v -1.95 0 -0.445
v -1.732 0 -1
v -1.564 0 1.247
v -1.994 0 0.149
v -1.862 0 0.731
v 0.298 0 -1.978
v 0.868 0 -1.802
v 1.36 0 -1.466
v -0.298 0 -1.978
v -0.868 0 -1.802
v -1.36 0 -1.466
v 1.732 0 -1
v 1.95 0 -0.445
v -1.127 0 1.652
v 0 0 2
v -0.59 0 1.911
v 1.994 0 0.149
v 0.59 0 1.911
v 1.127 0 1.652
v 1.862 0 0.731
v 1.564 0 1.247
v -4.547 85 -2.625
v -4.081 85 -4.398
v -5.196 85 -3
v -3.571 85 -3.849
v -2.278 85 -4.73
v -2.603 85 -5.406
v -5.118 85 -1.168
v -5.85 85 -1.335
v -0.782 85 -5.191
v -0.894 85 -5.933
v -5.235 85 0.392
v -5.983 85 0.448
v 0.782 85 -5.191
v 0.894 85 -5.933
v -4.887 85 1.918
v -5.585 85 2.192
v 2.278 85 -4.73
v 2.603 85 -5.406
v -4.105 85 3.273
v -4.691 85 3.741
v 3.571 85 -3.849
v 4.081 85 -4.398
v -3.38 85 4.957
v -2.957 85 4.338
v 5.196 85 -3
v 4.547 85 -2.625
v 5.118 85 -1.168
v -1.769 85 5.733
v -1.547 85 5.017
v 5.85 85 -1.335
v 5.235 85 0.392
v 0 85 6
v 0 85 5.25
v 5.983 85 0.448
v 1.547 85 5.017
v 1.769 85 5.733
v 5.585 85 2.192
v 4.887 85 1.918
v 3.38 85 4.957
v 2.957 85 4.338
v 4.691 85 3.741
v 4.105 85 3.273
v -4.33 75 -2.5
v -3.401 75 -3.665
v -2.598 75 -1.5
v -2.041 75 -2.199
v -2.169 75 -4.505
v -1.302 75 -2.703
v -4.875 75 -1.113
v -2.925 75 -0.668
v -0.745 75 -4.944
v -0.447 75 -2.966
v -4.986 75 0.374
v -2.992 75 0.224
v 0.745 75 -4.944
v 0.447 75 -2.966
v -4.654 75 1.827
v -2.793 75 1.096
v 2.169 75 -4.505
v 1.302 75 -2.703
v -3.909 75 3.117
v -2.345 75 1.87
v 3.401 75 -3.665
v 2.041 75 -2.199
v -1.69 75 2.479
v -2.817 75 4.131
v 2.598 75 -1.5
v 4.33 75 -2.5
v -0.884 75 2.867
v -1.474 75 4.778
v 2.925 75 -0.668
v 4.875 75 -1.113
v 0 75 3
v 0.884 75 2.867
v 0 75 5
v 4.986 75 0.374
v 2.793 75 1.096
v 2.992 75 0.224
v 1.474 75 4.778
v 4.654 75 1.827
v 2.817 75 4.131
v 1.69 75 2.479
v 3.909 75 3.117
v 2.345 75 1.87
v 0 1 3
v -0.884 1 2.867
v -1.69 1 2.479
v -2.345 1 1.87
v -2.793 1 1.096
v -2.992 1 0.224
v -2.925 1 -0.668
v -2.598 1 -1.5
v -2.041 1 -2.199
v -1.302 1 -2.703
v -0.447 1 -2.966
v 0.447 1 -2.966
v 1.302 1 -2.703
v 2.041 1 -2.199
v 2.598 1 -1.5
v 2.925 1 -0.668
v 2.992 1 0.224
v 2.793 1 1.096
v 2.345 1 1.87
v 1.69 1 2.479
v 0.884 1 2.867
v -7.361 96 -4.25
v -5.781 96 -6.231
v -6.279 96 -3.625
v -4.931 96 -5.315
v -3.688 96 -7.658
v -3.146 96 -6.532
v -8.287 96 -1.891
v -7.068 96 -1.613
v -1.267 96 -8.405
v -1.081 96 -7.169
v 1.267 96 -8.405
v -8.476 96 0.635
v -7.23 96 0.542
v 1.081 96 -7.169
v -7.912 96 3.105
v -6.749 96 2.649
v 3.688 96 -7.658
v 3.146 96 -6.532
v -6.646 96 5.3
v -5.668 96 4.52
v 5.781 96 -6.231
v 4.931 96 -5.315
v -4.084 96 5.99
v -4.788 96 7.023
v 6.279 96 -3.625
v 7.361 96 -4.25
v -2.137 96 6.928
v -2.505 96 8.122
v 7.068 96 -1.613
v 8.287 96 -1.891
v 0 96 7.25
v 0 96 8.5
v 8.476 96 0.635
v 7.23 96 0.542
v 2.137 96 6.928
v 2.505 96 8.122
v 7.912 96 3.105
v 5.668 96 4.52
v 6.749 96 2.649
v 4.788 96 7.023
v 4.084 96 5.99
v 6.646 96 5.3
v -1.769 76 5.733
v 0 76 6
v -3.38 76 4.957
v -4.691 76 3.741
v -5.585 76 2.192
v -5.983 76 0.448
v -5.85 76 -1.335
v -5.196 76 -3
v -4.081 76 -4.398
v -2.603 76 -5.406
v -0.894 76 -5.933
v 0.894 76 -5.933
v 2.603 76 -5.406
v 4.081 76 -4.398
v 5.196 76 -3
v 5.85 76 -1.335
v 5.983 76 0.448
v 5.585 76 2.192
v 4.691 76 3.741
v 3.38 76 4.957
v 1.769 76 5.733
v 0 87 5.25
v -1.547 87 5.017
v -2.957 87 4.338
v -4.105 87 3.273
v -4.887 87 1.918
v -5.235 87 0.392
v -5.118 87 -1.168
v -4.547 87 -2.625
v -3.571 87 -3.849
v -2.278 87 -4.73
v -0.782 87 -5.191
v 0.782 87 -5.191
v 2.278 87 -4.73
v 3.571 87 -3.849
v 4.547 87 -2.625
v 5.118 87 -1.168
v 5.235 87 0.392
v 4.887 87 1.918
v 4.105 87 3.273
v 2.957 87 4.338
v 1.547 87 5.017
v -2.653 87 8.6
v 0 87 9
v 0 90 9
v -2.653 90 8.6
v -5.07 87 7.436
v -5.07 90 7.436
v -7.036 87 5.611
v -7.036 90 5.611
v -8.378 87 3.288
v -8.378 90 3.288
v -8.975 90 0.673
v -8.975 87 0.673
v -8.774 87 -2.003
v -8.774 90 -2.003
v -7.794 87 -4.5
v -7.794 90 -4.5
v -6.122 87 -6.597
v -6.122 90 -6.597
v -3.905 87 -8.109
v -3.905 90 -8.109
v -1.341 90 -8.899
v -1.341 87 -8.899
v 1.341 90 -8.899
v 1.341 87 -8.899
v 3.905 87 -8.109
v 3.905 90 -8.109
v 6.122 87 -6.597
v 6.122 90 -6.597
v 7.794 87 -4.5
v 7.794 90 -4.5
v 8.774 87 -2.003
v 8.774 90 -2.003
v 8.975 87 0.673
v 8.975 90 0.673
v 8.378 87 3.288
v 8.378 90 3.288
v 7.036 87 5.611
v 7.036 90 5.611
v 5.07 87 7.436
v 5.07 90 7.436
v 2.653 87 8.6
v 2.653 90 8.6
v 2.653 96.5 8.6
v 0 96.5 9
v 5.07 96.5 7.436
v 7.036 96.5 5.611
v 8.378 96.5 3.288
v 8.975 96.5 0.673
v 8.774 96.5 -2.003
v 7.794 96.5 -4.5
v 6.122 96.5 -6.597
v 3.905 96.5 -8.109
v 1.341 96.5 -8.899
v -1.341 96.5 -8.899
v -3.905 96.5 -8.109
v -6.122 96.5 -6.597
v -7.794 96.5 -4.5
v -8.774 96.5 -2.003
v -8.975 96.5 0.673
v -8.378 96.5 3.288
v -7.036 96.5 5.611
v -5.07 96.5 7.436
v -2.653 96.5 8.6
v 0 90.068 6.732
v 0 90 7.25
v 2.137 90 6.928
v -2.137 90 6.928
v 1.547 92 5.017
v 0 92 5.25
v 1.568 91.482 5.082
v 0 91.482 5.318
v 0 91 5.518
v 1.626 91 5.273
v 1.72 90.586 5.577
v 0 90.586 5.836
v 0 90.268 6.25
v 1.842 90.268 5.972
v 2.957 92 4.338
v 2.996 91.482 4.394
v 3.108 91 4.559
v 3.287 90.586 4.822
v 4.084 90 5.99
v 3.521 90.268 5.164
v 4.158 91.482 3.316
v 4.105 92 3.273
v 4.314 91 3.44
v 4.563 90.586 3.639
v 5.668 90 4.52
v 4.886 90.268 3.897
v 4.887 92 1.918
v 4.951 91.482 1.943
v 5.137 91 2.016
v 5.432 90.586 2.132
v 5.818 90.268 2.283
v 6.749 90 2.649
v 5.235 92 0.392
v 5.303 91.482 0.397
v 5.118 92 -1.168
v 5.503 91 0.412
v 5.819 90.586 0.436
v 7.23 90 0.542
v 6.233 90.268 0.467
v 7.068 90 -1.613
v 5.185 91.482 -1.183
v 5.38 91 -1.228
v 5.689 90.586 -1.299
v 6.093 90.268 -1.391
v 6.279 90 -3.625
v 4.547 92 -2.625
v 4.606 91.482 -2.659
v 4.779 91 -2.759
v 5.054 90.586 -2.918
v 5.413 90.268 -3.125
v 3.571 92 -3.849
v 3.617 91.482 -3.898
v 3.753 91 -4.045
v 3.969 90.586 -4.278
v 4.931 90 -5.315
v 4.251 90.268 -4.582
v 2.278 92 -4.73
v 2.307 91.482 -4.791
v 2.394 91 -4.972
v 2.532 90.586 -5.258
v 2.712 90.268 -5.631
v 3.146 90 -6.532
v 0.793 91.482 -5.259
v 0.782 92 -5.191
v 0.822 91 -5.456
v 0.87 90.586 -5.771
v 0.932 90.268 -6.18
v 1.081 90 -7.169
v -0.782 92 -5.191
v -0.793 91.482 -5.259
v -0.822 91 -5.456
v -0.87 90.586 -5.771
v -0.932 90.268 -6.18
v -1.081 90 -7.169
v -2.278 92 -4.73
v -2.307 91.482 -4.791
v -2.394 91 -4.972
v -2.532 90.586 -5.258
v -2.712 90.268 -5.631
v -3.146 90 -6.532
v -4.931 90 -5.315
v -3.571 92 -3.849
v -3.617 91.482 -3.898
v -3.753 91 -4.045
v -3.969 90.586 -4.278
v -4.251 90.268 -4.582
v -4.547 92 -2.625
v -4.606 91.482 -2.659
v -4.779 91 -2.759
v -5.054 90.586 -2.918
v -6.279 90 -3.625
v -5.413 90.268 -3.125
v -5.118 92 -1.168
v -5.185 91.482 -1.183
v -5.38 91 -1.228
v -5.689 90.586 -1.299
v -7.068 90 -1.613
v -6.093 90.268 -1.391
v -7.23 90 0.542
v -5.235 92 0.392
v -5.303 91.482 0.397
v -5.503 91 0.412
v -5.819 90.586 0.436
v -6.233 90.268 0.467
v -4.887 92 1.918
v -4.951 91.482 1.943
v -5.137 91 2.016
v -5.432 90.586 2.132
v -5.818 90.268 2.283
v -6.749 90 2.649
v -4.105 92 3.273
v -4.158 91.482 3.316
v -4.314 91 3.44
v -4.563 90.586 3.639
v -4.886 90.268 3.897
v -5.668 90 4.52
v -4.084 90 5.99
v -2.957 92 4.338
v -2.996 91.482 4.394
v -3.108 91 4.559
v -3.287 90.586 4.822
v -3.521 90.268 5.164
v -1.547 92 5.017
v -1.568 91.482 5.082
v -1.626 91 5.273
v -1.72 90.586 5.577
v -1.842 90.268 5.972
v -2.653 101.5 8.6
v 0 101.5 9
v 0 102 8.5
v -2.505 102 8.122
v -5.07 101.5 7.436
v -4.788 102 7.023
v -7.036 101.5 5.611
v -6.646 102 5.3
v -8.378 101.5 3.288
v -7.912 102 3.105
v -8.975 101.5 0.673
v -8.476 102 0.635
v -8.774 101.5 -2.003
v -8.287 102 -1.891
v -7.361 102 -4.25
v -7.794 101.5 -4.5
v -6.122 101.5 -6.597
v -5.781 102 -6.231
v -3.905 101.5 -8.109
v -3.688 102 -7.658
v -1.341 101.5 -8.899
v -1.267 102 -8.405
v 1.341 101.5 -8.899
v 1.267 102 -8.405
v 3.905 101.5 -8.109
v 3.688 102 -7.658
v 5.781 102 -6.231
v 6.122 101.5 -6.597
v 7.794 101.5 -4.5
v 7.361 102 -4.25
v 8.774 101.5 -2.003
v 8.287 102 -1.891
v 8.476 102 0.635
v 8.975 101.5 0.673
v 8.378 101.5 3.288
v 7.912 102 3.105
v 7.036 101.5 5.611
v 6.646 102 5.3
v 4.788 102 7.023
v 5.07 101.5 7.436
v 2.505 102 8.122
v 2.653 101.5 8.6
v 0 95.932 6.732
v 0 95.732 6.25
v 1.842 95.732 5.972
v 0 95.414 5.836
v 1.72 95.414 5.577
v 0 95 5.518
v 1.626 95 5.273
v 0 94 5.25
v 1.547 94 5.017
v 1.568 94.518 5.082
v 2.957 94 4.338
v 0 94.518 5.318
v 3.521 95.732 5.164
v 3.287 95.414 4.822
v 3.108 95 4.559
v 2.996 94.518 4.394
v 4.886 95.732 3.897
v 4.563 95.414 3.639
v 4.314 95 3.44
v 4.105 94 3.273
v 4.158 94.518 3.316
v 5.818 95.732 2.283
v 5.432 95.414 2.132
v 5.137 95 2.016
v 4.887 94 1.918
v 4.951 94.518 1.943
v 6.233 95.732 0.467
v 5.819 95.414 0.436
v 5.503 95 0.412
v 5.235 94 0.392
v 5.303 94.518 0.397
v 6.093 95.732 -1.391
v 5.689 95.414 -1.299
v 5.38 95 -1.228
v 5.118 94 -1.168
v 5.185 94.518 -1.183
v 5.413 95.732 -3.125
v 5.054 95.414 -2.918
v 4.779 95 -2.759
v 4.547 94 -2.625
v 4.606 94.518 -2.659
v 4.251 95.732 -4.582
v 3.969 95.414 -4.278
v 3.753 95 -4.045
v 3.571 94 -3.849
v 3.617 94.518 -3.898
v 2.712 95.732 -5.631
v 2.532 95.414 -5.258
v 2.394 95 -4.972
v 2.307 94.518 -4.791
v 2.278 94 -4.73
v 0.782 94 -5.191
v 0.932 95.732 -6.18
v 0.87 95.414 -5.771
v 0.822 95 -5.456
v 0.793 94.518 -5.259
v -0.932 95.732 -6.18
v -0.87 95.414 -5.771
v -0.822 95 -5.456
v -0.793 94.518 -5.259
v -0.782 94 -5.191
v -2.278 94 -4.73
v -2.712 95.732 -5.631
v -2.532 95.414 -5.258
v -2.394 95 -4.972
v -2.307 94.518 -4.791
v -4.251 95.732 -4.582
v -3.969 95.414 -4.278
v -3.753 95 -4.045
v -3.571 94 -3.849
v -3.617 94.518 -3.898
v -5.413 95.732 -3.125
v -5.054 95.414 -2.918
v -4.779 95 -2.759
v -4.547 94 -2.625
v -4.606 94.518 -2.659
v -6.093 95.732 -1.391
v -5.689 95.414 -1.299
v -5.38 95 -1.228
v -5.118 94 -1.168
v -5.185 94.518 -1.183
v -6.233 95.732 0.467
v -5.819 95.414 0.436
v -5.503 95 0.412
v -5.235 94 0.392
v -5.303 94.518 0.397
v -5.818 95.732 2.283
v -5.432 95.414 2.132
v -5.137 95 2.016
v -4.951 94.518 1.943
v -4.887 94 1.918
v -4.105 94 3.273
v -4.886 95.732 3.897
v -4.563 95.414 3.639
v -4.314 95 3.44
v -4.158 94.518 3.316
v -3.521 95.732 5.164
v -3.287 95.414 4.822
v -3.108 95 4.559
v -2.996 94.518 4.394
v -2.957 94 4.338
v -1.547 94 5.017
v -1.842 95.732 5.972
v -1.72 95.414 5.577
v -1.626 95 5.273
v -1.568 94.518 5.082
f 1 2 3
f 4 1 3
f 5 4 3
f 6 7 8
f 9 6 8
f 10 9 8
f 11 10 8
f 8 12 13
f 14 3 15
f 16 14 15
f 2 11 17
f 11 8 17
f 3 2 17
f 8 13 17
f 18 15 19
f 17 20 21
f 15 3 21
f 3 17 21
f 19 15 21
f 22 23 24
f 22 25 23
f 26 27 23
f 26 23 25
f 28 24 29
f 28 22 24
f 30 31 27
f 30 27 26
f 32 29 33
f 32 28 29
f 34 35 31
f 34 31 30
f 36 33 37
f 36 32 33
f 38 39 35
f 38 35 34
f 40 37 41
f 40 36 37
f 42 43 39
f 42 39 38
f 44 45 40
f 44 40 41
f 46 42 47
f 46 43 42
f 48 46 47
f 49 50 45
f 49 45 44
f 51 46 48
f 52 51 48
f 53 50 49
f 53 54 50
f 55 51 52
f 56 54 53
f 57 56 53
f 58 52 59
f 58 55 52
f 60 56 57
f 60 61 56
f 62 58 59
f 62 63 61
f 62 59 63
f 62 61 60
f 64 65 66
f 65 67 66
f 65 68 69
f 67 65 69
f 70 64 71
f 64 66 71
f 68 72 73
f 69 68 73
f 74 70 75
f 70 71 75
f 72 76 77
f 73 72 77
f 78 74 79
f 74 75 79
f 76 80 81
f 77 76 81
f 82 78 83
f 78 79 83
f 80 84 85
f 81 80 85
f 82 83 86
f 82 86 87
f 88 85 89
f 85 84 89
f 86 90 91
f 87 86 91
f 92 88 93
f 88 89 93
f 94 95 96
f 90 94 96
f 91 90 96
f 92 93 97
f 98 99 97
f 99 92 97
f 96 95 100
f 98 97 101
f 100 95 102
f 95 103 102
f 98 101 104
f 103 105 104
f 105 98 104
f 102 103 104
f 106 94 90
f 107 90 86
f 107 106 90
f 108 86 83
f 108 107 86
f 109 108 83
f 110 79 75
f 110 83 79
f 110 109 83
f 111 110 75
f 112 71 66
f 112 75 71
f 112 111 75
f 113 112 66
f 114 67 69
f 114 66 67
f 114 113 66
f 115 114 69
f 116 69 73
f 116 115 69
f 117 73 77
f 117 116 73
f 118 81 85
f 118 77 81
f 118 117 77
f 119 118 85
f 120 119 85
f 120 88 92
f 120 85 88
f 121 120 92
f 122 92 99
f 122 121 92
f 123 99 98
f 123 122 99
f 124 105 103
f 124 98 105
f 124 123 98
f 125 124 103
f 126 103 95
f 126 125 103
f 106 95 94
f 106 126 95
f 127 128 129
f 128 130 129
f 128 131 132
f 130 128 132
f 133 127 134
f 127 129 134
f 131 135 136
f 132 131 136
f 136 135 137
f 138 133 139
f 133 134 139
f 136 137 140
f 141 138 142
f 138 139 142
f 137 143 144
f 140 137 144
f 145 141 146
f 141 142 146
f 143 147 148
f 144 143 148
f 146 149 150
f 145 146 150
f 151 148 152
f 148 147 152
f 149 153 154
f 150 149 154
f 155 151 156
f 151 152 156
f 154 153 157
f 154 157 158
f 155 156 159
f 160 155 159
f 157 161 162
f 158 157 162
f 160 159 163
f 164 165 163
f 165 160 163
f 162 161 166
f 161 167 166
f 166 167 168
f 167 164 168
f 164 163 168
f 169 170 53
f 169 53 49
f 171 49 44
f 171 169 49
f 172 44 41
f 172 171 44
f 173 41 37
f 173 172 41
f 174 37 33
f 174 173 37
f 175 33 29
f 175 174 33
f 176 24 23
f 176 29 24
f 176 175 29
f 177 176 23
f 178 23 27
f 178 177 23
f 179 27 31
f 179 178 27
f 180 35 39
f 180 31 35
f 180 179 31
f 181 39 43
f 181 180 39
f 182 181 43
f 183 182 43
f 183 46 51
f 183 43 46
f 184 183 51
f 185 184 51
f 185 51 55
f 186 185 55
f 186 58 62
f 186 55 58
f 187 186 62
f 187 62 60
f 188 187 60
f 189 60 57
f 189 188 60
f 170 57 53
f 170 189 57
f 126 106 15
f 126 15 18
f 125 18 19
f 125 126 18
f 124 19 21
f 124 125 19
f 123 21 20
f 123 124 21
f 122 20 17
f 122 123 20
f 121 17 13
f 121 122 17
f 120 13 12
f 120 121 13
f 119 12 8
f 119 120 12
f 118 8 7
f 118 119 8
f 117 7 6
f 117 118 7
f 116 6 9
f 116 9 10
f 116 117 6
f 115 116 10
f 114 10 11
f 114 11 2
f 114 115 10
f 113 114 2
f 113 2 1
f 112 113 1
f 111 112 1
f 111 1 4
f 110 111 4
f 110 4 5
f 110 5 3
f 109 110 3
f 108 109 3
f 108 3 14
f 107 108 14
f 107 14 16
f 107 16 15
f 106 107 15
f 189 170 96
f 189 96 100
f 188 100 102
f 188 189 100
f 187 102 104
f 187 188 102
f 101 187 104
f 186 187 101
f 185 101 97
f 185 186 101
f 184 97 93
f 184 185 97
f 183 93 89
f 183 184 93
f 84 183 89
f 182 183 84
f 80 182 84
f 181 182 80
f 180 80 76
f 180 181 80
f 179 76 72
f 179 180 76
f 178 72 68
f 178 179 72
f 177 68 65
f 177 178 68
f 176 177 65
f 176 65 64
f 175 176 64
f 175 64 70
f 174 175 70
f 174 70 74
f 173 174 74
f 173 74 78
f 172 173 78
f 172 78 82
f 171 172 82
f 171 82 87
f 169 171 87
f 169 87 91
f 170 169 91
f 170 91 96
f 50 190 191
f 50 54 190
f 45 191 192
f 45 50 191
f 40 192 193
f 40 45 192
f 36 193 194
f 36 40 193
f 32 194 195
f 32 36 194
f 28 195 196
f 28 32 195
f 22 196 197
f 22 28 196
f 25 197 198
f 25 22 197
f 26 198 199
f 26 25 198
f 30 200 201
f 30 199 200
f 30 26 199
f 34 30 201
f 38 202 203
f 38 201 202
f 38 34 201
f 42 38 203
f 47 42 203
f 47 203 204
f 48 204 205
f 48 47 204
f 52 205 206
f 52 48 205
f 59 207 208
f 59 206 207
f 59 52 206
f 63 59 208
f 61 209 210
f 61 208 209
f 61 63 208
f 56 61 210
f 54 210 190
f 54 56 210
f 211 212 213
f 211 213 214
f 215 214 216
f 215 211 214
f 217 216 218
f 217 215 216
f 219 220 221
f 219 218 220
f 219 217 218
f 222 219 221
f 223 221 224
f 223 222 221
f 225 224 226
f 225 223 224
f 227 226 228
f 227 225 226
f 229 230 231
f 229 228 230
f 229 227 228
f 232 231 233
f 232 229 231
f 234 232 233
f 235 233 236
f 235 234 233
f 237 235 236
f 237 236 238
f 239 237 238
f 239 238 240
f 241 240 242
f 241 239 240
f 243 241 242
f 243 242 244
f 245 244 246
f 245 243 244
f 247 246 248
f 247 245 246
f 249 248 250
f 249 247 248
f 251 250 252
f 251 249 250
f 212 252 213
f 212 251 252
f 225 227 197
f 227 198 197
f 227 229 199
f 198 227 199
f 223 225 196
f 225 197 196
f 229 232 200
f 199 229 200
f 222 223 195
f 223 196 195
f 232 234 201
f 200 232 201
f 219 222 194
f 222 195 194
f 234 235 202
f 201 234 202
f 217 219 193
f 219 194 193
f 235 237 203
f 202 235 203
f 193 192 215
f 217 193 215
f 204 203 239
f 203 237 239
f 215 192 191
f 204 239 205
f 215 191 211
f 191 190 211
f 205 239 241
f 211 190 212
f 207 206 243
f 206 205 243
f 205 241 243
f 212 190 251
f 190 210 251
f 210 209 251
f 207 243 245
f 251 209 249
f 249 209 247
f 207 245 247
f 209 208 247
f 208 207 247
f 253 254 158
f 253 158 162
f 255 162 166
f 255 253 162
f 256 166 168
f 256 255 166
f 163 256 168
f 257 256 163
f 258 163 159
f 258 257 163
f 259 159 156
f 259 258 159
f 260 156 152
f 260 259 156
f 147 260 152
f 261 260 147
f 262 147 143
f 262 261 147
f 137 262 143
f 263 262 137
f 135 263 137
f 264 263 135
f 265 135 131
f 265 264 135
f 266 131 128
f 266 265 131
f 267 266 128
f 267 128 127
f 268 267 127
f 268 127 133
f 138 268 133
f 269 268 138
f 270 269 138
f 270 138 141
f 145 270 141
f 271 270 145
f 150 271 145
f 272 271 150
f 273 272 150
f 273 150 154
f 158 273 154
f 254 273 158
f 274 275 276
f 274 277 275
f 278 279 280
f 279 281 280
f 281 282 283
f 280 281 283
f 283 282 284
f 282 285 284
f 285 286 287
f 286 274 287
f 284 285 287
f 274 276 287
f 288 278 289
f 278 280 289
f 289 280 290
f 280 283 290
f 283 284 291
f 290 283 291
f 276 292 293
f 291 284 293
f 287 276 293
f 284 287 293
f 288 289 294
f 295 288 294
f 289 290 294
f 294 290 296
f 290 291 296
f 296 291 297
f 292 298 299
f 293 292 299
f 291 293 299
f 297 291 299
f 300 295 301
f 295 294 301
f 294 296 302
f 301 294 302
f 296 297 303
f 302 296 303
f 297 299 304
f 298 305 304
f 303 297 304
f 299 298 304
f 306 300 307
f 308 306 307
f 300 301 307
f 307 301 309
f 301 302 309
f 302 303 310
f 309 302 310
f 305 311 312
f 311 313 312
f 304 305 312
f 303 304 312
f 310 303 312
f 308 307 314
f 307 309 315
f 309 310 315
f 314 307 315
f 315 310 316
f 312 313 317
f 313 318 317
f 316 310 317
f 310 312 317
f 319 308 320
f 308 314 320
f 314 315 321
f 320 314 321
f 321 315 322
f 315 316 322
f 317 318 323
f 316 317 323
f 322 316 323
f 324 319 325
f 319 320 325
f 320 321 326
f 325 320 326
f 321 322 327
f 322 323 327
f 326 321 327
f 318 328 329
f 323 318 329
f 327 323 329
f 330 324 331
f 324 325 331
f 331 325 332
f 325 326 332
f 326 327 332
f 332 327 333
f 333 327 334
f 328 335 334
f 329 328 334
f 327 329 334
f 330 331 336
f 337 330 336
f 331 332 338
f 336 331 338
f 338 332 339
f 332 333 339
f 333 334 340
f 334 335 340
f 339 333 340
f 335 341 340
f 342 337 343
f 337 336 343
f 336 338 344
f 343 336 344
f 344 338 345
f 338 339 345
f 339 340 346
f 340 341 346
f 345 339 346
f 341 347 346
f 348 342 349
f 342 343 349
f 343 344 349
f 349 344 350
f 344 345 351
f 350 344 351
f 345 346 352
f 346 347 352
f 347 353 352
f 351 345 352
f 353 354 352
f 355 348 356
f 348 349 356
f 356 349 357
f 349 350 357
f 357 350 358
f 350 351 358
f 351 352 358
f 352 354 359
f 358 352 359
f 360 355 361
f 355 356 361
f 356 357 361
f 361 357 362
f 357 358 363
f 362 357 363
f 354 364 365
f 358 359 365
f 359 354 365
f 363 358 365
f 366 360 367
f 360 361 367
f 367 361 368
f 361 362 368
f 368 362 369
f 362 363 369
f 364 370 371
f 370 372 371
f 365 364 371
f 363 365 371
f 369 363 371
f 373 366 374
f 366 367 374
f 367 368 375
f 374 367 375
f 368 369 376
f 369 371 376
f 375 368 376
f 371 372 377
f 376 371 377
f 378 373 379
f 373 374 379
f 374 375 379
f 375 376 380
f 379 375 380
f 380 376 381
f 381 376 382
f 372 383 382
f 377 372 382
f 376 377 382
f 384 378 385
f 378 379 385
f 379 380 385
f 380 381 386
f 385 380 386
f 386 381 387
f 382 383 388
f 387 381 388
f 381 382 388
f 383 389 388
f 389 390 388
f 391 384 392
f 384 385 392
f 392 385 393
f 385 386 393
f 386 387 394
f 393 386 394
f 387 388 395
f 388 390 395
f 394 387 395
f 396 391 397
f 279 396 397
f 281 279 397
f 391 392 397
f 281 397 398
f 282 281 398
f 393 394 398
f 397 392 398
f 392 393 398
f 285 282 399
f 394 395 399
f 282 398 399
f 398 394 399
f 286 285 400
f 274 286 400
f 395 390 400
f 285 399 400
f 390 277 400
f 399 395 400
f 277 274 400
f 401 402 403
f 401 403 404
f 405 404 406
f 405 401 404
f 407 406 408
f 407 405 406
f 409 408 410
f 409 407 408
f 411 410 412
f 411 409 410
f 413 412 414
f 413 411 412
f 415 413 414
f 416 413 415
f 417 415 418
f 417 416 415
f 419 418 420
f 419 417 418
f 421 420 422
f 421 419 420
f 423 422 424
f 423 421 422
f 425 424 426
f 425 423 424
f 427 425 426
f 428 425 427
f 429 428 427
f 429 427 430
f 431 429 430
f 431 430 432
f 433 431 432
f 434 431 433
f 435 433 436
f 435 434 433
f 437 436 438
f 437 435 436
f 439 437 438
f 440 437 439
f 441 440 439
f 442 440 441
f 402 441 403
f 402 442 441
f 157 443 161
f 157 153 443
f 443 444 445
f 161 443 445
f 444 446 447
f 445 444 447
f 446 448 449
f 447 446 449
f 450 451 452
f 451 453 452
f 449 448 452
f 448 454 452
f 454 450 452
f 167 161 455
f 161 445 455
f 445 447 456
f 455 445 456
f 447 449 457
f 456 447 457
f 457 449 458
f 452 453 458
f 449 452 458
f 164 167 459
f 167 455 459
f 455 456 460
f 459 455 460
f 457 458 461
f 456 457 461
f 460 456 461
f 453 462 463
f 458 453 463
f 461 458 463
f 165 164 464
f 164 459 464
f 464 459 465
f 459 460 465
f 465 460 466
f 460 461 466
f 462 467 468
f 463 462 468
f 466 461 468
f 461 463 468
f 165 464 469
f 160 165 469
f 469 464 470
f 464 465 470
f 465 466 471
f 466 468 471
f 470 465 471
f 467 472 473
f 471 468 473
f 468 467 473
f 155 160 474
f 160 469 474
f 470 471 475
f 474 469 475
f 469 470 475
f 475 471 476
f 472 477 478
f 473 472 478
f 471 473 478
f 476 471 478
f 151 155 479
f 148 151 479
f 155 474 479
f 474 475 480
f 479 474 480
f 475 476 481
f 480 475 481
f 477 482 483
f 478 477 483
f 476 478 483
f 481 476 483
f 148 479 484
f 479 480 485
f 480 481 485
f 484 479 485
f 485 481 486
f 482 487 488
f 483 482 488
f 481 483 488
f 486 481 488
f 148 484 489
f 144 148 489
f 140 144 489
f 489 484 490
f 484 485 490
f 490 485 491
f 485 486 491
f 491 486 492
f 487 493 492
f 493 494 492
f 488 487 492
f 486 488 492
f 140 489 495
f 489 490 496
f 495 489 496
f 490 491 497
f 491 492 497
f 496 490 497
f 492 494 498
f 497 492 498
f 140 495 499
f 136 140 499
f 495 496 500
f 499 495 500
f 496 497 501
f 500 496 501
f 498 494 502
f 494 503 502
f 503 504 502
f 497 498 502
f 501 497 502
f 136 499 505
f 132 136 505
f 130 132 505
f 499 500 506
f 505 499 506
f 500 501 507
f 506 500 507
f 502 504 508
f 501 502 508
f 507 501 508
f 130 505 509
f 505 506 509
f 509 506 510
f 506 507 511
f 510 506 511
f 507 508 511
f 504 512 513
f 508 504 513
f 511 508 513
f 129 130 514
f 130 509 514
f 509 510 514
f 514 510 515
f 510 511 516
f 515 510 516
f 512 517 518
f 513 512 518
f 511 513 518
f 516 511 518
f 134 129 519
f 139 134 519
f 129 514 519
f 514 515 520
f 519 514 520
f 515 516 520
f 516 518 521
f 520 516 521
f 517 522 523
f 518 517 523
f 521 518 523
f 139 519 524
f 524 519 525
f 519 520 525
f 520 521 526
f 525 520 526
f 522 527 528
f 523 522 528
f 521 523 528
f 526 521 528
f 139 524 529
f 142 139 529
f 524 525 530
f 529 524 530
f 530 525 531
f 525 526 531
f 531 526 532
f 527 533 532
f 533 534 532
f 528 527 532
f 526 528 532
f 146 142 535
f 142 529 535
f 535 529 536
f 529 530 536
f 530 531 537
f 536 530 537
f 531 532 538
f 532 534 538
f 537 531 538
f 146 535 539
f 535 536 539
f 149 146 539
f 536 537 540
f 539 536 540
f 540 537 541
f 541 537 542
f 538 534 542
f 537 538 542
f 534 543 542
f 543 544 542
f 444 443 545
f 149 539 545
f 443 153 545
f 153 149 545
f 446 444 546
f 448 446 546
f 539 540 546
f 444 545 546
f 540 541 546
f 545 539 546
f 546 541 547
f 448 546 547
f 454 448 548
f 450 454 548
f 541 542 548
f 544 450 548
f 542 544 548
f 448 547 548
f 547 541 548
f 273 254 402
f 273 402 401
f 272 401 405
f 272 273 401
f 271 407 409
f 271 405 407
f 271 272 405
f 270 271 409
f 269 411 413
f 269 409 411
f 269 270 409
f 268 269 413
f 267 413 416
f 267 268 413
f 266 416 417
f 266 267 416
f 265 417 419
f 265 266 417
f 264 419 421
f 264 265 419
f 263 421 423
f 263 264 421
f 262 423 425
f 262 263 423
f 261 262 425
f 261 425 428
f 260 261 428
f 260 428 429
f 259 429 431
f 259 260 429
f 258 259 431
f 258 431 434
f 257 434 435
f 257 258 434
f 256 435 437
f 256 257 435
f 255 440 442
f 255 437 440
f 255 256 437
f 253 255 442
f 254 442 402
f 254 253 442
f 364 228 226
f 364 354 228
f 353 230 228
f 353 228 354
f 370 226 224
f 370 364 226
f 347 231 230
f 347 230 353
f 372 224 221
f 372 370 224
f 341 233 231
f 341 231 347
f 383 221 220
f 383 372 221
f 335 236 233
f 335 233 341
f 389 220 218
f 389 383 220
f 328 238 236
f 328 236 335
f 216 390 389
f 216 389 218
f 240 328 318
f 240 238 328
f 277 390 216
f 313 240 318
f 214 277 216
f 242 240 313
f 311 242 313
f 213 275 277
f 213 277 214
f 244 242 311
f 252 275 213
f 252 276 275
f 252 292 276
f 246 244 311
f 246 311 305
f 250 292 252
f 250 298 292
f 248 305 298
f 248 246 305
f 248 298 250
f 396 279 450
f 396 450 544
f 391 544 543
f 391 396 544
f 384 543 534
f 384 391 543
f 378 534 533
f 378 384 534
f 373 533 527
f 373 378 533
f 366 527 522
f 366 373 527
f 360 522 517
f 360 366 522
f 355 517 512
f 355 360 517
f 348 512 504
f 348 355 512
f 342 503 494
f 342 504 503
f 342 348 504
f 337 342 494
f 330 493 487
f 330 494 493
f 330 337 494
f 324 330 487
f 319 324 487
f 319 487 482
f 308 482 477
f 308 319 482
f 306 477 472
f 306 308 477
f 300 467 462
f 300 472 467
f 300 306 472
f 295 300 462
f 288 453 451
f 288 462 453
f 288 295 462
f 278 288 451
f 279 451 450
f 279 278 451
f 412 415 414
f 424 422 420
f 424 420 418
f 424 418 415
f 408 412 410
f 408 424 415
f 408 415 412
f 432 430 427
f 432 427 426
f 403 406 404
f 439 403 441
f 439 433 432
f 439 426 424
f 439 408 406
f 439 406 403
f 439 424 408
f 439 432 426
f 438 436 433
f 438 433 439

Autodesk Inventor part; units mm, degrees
ref_plane "YZ Plane" through (0, 0, 0) normal (1, 0, 0) x (0, 1, 0)
ref_plane "XZ Plane" through (0, 0, 0) normal (0, 1, 0) x (-1, 0, 0)
ref_plane "XY Plane" through (0, 0, 0) normal (0, 0, 1) x (1, 0, 0)
sketch "Sketch1" plane through (0, 0, 0) normal (1, 0, 0) x (0, 1, 0)
  line L0 (0, 0) -> (104.5, 0)
  line L1 (0, 0) -> (75, 0)
  line L2 (75, 0) -> (75, 3)
  line L3 (75, 3) -> (0, 3)
  line L4 (0, 3) -> (0, 0)
  line L5 (75, 0) -> (85, 0)
  line L6 (85, 0) -> (85, 6)
  line L7 (85, 6) -> (75, 6)
  line L8 (75, 6) -> (75, 0)
  line L9 (85, 0) -> (87, 0)
  line L10 (87, 0) -> (87, 5.25)
  line L11 (87, 5.25) -> (85, 5.25)
  line L12 (85, 5.25) -> (85, 0)
  line L13 (87, 0) -> (90, 0)
  line L14 (90, 0) -> (90, 9)
  line L15 (90, 9) -> (87, 9)
  line L16 (87, 9) -> (87, 0)
  line L17 (90, 0) -> (96, 0)
  line L18 (96, 0) -> (96, 5.25)
  line L19 (96, 5.25) -> (90, 5.25)
  line L20 (90, 5.25) -> (90, 0)
  line L21 (96, 0) -> (102, 0)
  line L22 (102, 0) -> (102, 9)
  line L23 (102, 9) -> (96, 9)
  line L24 (96, 9) -> (96, 0)
  point P0 (102, 2.5)
  dimension "d0" = 6
  dimension "d2" = 12
  dimension "d3" = 10
  dimension "d5" = 2
  dimension "d6" = 75
  dimension "d7" = 10.5
  dimension "d8" = 18
  dimension "d9" = 3
  dimension "d10" = 6
  dimension "d11" = 6
revolve "Revolution1" add sketch "Sketch1" angle 360 about axis through (0, 0, 0) along (0, 1, 0)
chamfer "Chamfer1" distance 1 angle 45 1 edges at (0, 0, -3)
chamfer "Chamfer2" distance 1 angle 45 1 edges at (0, 75, -6)
chamfer "Chamfer4" distance 0.5 angle 45 2 edges at (0, 102, -9) (0, 96, -9)
fillet "Fillet1" radius 2 2 edges at (0, 90, -5.25) (0, 96, -5.25)
thread "Thread1" size "M12x0.5" class "6g" standard "ISO Metric profile" full length
properties part number "05_Que_tham_dau"
